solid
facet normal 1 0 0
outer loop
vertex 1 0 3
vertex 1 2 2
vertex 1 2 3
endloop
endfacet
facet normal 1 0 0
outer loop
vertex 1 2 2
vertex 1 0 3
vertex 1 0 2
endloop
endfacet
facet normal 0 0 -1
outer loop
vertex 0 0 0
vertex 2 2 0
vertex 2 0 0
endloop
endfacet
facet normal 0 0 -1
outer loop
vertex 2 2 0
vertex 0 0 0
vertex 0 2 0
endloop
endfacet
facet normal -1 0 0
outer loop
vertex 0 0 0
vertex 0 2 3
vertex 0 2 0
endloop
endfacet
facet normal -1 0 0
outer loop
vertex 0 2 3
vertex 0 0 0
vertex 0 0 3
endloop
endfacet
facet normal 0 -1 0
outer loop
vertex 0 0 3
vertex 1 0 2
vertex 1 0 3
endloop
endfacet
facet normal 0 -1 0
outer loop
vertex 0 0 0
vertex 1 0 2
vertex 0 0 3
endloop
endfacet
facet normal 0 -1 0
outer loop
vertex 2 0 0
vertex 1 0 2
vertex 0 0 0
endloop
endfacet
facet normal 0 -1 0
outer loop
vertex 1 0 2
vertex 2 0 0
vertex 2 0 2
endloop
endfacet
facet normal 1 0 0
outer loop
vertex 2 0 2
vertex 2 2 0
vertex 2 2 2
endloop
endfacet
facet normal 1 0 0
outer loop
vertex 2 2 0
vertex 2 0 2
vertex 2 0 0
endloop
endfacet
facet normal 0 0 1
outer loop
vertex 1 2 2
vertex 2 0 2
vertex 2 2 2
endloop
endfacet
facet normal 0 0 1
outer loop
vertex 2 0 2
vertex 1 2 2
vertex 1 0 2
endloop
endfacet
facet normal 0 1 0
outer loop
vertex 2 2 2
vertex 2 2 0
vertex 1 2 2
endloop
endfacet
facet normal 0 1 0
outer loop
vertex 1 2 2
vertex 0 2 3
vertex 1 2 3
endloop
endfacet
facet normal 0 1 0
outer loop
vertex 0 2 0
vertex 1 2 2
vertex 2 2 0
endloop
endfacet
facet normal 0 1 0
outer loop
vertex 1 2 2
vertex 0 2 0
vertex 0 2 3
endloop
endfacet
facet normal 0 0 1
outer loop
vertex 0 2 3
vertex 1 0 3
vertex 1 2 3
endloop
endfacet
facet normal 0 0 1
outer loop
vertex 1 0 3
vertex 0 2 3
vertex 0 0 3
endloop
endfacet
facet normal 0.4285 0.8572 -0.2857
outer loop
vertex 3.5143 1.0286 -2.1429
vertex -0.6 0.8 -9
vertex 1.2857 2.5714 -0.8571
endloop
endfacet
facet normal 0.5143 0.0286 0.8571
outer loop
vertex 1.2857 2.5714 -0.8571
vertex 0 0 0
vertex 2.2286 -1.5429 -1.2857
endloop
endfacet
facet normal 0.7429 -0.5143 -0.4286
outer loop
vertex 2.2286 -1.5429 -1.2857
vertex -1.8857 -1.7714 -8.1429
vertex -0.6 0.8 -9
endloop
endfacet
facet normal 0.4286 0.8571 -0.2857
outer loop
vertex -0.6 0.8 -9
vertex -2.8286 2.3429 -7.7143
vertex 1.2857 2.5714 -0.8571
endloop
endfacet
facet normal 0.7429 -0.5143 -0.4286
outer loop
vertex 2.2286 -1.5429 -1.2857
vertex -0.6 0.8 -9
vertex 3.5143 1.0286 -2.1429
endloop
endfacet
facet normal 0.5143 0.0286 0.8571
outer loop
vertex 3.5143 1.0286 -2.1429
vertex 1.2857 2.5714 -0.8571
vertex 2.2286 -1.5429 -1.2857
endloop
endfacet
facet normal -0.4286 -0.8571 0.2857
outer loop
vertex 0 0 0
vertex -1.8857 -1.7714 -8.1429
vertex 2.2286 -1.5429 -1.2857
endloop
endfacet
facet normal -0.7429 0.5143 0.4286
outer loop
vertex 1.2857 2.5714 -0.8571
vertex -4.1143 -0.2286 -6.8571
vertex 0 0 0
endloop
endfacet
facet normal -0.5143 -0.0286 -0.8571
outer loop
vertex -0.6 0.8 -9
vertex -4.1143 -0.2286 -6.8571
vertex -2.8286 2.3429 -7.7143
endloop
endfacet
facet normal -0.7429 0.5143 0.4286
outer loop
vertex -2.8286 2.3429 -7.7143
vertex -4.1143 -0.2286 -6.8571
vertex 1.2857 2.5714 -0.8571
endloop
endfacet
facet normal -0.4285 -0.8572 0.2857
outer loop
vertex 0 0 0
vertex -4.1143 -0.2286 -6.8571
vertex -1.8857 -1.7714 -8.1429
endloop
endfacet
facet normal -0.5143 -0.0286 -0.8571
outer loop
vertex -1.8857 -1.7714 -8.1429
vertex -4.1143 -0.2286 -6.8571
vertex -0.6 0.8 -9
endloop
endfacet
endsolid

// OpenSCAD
//Various lengths
cube();  //I'm fine
cube(2); //I'm fine
cube([1]);
cube([1,2]);
cube([1,2,3]); //I'm fine
cube([1,2,3,4]);
cube([[1],2,3]);

//not numbers
cube([1,"test",3]);
cube([1,"2",3]);
cube(["1.2","2",3]);
cube("[1,2,3]");

square();
square(2); //I'm fine
square([1]);
square([1,2]);
square([1,2,3]);
square("[1,2]");

mirror()
mirror(1)
mirror([1,2])//I'm fine
mirror([1,2,3])//I'm fine
mirror([1,2,3,4])
mirror("[1,2,3]")

scale()
scale(1)//I'm fine
scale([1])
scale([1,2])  //I'm fine
scale([1,2,3])//I'm fine
scale([1,2,3,4])
scale("[1,2]")
cube([3,2,1]); //I'm fine

//here we have to decide how to handle it:
cube([1,-2,3]);
cube([1/0,2,3]);
